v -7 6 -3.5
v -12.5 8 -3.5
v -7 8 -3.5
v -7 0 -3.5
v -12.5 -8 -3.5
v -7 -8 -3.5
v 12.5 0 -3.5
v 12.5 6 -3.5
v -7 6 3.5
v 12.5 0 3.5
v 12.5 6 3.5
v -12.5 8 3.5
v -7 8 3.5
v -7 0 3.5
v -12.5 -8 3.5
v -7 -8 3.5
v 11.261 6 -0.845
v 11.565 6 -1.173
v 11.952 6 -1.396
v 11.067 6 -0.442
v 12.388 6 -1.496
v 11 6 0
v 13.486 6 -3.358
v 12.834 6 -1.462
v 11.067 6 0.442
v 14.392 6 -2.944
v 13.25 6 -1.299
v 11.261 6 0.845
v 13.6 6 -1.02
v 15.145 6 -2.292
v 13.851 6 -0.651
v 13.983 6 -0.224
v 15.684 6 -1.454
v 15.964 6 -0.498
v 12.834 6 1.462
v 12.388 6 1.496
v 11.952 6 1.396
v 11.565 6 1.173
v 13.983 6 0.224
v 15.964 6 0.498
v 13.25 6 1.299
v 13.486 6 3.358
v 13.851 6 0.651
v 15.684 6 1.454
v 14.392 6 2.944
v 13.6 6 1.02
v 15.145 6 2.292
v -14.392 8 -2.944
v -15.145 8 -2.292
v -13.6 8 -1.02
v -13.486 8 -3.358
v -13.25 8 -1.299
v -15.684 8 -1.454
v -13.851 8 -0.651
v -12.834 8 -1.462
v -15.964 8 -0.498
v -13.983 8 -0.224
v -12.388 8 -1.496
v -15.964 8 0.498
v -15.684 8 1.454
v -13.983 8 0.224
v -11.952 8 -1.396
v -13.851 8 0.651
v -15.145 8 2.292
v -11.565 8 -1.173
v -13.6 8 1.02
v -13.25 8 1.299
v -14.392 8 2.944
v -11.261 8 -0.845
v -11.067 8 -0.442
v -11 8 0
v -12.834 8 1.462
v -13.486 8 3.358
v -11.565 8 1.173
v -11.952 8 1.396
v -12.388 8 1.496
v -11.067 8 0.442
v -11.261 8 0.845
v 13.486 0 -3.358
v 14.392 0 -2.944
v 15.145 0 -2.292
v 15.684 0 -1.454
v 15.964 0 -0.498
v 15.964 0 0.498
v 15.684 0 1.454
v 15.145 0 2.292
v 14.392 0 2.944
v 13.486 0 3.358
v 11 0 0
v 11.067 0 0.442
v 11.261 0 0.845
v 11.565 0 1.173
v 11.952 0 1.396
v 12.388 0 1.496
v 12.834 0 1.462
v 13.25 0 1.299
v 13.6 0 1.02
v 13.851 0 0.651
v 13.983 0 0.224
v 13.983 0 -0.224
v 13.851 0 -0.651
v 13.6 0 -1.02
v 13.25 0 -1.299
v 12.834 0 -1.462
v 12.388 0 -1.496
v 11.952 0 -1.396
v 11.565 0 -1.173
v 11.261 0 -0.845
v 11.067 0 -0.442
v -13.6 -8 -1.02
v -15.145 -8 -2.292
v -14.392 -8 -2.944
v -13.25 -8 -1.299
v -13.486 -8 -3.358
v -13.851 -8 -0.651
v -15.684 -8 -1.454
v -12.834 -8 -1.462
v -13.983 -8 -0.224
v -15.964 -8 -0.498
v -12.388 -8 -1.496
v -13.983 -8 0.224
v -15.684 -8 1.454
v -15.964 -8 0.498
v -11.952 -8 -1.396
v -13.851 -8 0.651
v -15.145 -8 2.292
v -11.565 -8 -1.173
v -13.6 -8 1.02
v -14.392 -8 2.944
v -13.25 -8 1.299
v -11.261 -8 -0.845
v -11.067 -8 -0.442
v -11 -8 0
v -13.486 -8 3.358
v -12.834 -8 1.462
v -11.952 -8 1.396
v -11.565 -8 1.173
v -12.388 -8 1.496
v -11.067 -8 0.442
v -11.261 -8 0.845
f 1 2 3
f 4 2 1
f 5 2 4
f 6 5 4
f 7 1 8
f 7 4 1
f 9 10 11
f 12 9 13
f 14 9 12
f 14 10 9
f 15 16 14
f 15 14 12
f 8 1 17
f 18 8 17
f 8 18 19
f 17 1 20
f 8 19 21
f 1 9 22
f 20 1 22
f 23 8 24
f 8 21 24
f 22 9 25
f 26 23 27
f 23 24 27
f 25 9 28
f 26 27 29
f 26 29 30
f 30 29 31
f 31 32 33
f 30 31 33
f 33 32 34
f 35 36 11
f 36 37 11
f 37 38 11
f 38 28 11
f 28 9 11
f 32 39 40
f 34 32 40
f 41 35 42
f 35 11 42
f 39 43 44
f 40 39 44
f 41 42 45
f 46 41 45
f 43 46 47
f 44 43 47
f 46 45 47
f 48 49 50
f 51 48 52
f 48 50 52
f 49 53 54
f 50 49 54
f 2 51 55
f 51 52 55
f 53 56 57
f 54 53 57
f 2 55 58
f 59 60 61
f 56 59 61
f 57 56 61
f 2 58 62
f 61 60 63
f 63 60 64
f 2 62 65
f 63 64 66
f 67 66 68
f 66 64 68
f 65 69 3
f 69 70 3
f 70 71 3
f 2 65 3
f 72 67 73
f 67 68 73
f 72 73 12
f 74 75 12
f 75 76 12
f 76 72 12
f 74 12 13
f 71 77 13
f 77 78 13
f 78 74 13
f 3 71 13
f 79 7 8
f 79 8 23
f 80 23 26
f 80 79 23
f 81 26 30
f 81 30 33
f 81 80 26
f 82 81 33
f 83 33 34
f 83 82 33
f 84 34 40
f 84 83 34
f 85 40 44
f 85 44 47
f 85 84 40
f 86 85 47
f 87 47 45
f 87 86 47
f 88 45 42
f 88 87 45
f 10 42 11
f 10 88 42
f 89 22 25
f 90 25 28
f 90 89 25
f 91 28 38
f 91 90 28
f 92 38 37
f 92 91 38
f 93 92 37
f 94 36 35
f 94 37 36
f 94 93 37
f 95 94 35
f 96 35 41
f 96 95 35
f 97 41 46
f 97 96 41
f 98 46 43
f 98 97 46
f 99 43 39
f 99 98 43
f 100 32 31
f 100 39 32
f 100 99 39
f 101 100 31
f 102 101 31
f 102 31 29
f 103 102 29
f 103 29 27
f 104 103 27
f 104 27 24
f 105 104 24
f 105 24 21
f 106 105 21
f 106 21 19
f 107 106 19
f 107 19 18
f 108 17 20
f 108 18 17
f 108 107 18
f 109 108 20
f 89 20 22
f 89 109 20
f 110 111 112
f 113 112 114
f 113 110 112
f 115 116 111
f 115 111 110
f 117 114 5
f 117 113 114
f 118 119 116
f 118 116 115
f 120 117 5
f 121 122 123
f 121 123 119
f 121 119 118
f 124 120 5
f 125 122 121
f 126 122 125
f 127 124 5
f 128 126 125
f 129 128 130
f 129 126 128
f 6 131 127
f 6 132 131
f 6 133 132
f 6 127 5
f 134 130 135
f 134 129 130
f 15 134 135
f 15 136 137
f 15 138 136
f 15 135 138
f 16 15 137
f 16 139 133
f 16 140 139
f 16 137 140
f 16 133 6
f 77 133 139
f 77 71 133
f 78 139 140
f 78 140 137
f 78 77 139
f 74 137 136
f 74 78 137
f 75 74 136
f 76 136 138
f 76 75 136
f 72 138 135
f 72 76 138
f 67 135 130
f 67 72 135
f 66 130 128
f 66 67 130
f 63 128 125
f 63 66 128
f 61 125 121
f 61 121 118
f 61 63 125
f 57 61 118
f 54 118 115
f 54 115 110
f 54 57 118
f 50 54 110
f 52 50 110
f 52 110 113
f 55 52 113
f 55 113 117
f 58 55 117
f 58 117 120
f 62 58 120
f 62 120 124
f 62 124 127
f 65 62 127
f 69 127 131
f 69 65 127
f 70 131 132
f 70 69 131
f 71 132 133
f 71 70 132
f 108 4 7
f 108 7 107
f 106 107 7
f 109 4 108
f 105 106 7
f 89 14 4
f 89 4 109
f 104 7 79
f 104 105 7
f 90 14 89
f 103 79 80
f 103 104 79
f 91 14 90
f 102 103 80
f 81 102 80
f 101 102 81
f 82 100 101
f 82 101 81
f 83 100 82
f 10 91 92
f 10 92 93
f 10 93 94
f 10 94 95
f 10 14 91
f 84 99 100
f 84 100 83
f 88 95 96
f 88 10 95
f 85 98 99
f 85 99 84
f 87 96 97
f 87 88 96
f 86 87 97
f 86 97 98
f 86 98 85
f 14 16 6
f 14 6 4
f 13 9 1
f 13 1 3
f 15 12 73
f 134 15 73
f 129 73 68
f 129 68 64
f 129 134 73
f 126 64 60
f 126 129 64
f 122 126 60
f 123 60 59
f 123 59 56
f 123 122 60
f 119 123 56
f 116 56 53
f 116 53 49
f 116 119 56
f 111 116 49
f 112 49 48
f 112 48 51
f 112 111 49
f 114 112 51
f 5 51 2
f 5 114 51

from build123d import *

# Parameters (mm, degrees)
F0_R     = 1.5
F1_DEPTH = 8
F2_W     = 40.742426
F2_H     = 15.659974
F2_W_2   = 45.289567
F2_H_2   = 22.391903
F3_DEPTH = 25.4


with BuildPart() as f1:
    # F0 (on Front) → F1 (new body, symmetric)
    with BuildSketch(Plane.XZ):
        with BuildLine():
            ThreePointArc((14, 0), (12.5, 1.5), (11, 0))
            ThreePointArc((11, 0), (12.5, -1.5), (14, 0))
        make_face()
        with Locations((-12.5, 0)):
            Circle(F0_R)
        with BuildLine():
            Line((12.5, 3.5), (-12.5, 3.5))
            ThreePointArc((-12.5, 3.5), (-16, 0), (-12.5, -3.5))
            Line((-12.5, -3.5), (12.5, -3.5))
            ThreePointArc((12.5, -3.5), (16, 0), (12.5, 3.5))
        make_face()
        with Locations((-12.5, 0)):
            Circle(F0_R, mode=Mode.SUBTRACT)
        with BuildLine():
            ThreePointArc((14, 0), (12.5, -1.5), (11, 0))
            ThreePointArc((11, 0), (12.5, 1.5), (14, 0))
        make_face(mode=Mode.SUBTRACT)
    extrude(amount=F1_DEPTH, both=True)

    # F2 (on face) → F3 (cut)
    with BuildSketch(Plane.XY.offset(3.5)):
        with Locations((13.371213, 13.829987)):
            Rectangle(F2_W, F2_H)
        with Locations((15.644783, -11.195951)):
            Rectangle(F2_W_2, F2_H_2)
    extrude(amount=-F3_DEPTH, mode=Mode.SUBTRACT)


solid = f1.part
